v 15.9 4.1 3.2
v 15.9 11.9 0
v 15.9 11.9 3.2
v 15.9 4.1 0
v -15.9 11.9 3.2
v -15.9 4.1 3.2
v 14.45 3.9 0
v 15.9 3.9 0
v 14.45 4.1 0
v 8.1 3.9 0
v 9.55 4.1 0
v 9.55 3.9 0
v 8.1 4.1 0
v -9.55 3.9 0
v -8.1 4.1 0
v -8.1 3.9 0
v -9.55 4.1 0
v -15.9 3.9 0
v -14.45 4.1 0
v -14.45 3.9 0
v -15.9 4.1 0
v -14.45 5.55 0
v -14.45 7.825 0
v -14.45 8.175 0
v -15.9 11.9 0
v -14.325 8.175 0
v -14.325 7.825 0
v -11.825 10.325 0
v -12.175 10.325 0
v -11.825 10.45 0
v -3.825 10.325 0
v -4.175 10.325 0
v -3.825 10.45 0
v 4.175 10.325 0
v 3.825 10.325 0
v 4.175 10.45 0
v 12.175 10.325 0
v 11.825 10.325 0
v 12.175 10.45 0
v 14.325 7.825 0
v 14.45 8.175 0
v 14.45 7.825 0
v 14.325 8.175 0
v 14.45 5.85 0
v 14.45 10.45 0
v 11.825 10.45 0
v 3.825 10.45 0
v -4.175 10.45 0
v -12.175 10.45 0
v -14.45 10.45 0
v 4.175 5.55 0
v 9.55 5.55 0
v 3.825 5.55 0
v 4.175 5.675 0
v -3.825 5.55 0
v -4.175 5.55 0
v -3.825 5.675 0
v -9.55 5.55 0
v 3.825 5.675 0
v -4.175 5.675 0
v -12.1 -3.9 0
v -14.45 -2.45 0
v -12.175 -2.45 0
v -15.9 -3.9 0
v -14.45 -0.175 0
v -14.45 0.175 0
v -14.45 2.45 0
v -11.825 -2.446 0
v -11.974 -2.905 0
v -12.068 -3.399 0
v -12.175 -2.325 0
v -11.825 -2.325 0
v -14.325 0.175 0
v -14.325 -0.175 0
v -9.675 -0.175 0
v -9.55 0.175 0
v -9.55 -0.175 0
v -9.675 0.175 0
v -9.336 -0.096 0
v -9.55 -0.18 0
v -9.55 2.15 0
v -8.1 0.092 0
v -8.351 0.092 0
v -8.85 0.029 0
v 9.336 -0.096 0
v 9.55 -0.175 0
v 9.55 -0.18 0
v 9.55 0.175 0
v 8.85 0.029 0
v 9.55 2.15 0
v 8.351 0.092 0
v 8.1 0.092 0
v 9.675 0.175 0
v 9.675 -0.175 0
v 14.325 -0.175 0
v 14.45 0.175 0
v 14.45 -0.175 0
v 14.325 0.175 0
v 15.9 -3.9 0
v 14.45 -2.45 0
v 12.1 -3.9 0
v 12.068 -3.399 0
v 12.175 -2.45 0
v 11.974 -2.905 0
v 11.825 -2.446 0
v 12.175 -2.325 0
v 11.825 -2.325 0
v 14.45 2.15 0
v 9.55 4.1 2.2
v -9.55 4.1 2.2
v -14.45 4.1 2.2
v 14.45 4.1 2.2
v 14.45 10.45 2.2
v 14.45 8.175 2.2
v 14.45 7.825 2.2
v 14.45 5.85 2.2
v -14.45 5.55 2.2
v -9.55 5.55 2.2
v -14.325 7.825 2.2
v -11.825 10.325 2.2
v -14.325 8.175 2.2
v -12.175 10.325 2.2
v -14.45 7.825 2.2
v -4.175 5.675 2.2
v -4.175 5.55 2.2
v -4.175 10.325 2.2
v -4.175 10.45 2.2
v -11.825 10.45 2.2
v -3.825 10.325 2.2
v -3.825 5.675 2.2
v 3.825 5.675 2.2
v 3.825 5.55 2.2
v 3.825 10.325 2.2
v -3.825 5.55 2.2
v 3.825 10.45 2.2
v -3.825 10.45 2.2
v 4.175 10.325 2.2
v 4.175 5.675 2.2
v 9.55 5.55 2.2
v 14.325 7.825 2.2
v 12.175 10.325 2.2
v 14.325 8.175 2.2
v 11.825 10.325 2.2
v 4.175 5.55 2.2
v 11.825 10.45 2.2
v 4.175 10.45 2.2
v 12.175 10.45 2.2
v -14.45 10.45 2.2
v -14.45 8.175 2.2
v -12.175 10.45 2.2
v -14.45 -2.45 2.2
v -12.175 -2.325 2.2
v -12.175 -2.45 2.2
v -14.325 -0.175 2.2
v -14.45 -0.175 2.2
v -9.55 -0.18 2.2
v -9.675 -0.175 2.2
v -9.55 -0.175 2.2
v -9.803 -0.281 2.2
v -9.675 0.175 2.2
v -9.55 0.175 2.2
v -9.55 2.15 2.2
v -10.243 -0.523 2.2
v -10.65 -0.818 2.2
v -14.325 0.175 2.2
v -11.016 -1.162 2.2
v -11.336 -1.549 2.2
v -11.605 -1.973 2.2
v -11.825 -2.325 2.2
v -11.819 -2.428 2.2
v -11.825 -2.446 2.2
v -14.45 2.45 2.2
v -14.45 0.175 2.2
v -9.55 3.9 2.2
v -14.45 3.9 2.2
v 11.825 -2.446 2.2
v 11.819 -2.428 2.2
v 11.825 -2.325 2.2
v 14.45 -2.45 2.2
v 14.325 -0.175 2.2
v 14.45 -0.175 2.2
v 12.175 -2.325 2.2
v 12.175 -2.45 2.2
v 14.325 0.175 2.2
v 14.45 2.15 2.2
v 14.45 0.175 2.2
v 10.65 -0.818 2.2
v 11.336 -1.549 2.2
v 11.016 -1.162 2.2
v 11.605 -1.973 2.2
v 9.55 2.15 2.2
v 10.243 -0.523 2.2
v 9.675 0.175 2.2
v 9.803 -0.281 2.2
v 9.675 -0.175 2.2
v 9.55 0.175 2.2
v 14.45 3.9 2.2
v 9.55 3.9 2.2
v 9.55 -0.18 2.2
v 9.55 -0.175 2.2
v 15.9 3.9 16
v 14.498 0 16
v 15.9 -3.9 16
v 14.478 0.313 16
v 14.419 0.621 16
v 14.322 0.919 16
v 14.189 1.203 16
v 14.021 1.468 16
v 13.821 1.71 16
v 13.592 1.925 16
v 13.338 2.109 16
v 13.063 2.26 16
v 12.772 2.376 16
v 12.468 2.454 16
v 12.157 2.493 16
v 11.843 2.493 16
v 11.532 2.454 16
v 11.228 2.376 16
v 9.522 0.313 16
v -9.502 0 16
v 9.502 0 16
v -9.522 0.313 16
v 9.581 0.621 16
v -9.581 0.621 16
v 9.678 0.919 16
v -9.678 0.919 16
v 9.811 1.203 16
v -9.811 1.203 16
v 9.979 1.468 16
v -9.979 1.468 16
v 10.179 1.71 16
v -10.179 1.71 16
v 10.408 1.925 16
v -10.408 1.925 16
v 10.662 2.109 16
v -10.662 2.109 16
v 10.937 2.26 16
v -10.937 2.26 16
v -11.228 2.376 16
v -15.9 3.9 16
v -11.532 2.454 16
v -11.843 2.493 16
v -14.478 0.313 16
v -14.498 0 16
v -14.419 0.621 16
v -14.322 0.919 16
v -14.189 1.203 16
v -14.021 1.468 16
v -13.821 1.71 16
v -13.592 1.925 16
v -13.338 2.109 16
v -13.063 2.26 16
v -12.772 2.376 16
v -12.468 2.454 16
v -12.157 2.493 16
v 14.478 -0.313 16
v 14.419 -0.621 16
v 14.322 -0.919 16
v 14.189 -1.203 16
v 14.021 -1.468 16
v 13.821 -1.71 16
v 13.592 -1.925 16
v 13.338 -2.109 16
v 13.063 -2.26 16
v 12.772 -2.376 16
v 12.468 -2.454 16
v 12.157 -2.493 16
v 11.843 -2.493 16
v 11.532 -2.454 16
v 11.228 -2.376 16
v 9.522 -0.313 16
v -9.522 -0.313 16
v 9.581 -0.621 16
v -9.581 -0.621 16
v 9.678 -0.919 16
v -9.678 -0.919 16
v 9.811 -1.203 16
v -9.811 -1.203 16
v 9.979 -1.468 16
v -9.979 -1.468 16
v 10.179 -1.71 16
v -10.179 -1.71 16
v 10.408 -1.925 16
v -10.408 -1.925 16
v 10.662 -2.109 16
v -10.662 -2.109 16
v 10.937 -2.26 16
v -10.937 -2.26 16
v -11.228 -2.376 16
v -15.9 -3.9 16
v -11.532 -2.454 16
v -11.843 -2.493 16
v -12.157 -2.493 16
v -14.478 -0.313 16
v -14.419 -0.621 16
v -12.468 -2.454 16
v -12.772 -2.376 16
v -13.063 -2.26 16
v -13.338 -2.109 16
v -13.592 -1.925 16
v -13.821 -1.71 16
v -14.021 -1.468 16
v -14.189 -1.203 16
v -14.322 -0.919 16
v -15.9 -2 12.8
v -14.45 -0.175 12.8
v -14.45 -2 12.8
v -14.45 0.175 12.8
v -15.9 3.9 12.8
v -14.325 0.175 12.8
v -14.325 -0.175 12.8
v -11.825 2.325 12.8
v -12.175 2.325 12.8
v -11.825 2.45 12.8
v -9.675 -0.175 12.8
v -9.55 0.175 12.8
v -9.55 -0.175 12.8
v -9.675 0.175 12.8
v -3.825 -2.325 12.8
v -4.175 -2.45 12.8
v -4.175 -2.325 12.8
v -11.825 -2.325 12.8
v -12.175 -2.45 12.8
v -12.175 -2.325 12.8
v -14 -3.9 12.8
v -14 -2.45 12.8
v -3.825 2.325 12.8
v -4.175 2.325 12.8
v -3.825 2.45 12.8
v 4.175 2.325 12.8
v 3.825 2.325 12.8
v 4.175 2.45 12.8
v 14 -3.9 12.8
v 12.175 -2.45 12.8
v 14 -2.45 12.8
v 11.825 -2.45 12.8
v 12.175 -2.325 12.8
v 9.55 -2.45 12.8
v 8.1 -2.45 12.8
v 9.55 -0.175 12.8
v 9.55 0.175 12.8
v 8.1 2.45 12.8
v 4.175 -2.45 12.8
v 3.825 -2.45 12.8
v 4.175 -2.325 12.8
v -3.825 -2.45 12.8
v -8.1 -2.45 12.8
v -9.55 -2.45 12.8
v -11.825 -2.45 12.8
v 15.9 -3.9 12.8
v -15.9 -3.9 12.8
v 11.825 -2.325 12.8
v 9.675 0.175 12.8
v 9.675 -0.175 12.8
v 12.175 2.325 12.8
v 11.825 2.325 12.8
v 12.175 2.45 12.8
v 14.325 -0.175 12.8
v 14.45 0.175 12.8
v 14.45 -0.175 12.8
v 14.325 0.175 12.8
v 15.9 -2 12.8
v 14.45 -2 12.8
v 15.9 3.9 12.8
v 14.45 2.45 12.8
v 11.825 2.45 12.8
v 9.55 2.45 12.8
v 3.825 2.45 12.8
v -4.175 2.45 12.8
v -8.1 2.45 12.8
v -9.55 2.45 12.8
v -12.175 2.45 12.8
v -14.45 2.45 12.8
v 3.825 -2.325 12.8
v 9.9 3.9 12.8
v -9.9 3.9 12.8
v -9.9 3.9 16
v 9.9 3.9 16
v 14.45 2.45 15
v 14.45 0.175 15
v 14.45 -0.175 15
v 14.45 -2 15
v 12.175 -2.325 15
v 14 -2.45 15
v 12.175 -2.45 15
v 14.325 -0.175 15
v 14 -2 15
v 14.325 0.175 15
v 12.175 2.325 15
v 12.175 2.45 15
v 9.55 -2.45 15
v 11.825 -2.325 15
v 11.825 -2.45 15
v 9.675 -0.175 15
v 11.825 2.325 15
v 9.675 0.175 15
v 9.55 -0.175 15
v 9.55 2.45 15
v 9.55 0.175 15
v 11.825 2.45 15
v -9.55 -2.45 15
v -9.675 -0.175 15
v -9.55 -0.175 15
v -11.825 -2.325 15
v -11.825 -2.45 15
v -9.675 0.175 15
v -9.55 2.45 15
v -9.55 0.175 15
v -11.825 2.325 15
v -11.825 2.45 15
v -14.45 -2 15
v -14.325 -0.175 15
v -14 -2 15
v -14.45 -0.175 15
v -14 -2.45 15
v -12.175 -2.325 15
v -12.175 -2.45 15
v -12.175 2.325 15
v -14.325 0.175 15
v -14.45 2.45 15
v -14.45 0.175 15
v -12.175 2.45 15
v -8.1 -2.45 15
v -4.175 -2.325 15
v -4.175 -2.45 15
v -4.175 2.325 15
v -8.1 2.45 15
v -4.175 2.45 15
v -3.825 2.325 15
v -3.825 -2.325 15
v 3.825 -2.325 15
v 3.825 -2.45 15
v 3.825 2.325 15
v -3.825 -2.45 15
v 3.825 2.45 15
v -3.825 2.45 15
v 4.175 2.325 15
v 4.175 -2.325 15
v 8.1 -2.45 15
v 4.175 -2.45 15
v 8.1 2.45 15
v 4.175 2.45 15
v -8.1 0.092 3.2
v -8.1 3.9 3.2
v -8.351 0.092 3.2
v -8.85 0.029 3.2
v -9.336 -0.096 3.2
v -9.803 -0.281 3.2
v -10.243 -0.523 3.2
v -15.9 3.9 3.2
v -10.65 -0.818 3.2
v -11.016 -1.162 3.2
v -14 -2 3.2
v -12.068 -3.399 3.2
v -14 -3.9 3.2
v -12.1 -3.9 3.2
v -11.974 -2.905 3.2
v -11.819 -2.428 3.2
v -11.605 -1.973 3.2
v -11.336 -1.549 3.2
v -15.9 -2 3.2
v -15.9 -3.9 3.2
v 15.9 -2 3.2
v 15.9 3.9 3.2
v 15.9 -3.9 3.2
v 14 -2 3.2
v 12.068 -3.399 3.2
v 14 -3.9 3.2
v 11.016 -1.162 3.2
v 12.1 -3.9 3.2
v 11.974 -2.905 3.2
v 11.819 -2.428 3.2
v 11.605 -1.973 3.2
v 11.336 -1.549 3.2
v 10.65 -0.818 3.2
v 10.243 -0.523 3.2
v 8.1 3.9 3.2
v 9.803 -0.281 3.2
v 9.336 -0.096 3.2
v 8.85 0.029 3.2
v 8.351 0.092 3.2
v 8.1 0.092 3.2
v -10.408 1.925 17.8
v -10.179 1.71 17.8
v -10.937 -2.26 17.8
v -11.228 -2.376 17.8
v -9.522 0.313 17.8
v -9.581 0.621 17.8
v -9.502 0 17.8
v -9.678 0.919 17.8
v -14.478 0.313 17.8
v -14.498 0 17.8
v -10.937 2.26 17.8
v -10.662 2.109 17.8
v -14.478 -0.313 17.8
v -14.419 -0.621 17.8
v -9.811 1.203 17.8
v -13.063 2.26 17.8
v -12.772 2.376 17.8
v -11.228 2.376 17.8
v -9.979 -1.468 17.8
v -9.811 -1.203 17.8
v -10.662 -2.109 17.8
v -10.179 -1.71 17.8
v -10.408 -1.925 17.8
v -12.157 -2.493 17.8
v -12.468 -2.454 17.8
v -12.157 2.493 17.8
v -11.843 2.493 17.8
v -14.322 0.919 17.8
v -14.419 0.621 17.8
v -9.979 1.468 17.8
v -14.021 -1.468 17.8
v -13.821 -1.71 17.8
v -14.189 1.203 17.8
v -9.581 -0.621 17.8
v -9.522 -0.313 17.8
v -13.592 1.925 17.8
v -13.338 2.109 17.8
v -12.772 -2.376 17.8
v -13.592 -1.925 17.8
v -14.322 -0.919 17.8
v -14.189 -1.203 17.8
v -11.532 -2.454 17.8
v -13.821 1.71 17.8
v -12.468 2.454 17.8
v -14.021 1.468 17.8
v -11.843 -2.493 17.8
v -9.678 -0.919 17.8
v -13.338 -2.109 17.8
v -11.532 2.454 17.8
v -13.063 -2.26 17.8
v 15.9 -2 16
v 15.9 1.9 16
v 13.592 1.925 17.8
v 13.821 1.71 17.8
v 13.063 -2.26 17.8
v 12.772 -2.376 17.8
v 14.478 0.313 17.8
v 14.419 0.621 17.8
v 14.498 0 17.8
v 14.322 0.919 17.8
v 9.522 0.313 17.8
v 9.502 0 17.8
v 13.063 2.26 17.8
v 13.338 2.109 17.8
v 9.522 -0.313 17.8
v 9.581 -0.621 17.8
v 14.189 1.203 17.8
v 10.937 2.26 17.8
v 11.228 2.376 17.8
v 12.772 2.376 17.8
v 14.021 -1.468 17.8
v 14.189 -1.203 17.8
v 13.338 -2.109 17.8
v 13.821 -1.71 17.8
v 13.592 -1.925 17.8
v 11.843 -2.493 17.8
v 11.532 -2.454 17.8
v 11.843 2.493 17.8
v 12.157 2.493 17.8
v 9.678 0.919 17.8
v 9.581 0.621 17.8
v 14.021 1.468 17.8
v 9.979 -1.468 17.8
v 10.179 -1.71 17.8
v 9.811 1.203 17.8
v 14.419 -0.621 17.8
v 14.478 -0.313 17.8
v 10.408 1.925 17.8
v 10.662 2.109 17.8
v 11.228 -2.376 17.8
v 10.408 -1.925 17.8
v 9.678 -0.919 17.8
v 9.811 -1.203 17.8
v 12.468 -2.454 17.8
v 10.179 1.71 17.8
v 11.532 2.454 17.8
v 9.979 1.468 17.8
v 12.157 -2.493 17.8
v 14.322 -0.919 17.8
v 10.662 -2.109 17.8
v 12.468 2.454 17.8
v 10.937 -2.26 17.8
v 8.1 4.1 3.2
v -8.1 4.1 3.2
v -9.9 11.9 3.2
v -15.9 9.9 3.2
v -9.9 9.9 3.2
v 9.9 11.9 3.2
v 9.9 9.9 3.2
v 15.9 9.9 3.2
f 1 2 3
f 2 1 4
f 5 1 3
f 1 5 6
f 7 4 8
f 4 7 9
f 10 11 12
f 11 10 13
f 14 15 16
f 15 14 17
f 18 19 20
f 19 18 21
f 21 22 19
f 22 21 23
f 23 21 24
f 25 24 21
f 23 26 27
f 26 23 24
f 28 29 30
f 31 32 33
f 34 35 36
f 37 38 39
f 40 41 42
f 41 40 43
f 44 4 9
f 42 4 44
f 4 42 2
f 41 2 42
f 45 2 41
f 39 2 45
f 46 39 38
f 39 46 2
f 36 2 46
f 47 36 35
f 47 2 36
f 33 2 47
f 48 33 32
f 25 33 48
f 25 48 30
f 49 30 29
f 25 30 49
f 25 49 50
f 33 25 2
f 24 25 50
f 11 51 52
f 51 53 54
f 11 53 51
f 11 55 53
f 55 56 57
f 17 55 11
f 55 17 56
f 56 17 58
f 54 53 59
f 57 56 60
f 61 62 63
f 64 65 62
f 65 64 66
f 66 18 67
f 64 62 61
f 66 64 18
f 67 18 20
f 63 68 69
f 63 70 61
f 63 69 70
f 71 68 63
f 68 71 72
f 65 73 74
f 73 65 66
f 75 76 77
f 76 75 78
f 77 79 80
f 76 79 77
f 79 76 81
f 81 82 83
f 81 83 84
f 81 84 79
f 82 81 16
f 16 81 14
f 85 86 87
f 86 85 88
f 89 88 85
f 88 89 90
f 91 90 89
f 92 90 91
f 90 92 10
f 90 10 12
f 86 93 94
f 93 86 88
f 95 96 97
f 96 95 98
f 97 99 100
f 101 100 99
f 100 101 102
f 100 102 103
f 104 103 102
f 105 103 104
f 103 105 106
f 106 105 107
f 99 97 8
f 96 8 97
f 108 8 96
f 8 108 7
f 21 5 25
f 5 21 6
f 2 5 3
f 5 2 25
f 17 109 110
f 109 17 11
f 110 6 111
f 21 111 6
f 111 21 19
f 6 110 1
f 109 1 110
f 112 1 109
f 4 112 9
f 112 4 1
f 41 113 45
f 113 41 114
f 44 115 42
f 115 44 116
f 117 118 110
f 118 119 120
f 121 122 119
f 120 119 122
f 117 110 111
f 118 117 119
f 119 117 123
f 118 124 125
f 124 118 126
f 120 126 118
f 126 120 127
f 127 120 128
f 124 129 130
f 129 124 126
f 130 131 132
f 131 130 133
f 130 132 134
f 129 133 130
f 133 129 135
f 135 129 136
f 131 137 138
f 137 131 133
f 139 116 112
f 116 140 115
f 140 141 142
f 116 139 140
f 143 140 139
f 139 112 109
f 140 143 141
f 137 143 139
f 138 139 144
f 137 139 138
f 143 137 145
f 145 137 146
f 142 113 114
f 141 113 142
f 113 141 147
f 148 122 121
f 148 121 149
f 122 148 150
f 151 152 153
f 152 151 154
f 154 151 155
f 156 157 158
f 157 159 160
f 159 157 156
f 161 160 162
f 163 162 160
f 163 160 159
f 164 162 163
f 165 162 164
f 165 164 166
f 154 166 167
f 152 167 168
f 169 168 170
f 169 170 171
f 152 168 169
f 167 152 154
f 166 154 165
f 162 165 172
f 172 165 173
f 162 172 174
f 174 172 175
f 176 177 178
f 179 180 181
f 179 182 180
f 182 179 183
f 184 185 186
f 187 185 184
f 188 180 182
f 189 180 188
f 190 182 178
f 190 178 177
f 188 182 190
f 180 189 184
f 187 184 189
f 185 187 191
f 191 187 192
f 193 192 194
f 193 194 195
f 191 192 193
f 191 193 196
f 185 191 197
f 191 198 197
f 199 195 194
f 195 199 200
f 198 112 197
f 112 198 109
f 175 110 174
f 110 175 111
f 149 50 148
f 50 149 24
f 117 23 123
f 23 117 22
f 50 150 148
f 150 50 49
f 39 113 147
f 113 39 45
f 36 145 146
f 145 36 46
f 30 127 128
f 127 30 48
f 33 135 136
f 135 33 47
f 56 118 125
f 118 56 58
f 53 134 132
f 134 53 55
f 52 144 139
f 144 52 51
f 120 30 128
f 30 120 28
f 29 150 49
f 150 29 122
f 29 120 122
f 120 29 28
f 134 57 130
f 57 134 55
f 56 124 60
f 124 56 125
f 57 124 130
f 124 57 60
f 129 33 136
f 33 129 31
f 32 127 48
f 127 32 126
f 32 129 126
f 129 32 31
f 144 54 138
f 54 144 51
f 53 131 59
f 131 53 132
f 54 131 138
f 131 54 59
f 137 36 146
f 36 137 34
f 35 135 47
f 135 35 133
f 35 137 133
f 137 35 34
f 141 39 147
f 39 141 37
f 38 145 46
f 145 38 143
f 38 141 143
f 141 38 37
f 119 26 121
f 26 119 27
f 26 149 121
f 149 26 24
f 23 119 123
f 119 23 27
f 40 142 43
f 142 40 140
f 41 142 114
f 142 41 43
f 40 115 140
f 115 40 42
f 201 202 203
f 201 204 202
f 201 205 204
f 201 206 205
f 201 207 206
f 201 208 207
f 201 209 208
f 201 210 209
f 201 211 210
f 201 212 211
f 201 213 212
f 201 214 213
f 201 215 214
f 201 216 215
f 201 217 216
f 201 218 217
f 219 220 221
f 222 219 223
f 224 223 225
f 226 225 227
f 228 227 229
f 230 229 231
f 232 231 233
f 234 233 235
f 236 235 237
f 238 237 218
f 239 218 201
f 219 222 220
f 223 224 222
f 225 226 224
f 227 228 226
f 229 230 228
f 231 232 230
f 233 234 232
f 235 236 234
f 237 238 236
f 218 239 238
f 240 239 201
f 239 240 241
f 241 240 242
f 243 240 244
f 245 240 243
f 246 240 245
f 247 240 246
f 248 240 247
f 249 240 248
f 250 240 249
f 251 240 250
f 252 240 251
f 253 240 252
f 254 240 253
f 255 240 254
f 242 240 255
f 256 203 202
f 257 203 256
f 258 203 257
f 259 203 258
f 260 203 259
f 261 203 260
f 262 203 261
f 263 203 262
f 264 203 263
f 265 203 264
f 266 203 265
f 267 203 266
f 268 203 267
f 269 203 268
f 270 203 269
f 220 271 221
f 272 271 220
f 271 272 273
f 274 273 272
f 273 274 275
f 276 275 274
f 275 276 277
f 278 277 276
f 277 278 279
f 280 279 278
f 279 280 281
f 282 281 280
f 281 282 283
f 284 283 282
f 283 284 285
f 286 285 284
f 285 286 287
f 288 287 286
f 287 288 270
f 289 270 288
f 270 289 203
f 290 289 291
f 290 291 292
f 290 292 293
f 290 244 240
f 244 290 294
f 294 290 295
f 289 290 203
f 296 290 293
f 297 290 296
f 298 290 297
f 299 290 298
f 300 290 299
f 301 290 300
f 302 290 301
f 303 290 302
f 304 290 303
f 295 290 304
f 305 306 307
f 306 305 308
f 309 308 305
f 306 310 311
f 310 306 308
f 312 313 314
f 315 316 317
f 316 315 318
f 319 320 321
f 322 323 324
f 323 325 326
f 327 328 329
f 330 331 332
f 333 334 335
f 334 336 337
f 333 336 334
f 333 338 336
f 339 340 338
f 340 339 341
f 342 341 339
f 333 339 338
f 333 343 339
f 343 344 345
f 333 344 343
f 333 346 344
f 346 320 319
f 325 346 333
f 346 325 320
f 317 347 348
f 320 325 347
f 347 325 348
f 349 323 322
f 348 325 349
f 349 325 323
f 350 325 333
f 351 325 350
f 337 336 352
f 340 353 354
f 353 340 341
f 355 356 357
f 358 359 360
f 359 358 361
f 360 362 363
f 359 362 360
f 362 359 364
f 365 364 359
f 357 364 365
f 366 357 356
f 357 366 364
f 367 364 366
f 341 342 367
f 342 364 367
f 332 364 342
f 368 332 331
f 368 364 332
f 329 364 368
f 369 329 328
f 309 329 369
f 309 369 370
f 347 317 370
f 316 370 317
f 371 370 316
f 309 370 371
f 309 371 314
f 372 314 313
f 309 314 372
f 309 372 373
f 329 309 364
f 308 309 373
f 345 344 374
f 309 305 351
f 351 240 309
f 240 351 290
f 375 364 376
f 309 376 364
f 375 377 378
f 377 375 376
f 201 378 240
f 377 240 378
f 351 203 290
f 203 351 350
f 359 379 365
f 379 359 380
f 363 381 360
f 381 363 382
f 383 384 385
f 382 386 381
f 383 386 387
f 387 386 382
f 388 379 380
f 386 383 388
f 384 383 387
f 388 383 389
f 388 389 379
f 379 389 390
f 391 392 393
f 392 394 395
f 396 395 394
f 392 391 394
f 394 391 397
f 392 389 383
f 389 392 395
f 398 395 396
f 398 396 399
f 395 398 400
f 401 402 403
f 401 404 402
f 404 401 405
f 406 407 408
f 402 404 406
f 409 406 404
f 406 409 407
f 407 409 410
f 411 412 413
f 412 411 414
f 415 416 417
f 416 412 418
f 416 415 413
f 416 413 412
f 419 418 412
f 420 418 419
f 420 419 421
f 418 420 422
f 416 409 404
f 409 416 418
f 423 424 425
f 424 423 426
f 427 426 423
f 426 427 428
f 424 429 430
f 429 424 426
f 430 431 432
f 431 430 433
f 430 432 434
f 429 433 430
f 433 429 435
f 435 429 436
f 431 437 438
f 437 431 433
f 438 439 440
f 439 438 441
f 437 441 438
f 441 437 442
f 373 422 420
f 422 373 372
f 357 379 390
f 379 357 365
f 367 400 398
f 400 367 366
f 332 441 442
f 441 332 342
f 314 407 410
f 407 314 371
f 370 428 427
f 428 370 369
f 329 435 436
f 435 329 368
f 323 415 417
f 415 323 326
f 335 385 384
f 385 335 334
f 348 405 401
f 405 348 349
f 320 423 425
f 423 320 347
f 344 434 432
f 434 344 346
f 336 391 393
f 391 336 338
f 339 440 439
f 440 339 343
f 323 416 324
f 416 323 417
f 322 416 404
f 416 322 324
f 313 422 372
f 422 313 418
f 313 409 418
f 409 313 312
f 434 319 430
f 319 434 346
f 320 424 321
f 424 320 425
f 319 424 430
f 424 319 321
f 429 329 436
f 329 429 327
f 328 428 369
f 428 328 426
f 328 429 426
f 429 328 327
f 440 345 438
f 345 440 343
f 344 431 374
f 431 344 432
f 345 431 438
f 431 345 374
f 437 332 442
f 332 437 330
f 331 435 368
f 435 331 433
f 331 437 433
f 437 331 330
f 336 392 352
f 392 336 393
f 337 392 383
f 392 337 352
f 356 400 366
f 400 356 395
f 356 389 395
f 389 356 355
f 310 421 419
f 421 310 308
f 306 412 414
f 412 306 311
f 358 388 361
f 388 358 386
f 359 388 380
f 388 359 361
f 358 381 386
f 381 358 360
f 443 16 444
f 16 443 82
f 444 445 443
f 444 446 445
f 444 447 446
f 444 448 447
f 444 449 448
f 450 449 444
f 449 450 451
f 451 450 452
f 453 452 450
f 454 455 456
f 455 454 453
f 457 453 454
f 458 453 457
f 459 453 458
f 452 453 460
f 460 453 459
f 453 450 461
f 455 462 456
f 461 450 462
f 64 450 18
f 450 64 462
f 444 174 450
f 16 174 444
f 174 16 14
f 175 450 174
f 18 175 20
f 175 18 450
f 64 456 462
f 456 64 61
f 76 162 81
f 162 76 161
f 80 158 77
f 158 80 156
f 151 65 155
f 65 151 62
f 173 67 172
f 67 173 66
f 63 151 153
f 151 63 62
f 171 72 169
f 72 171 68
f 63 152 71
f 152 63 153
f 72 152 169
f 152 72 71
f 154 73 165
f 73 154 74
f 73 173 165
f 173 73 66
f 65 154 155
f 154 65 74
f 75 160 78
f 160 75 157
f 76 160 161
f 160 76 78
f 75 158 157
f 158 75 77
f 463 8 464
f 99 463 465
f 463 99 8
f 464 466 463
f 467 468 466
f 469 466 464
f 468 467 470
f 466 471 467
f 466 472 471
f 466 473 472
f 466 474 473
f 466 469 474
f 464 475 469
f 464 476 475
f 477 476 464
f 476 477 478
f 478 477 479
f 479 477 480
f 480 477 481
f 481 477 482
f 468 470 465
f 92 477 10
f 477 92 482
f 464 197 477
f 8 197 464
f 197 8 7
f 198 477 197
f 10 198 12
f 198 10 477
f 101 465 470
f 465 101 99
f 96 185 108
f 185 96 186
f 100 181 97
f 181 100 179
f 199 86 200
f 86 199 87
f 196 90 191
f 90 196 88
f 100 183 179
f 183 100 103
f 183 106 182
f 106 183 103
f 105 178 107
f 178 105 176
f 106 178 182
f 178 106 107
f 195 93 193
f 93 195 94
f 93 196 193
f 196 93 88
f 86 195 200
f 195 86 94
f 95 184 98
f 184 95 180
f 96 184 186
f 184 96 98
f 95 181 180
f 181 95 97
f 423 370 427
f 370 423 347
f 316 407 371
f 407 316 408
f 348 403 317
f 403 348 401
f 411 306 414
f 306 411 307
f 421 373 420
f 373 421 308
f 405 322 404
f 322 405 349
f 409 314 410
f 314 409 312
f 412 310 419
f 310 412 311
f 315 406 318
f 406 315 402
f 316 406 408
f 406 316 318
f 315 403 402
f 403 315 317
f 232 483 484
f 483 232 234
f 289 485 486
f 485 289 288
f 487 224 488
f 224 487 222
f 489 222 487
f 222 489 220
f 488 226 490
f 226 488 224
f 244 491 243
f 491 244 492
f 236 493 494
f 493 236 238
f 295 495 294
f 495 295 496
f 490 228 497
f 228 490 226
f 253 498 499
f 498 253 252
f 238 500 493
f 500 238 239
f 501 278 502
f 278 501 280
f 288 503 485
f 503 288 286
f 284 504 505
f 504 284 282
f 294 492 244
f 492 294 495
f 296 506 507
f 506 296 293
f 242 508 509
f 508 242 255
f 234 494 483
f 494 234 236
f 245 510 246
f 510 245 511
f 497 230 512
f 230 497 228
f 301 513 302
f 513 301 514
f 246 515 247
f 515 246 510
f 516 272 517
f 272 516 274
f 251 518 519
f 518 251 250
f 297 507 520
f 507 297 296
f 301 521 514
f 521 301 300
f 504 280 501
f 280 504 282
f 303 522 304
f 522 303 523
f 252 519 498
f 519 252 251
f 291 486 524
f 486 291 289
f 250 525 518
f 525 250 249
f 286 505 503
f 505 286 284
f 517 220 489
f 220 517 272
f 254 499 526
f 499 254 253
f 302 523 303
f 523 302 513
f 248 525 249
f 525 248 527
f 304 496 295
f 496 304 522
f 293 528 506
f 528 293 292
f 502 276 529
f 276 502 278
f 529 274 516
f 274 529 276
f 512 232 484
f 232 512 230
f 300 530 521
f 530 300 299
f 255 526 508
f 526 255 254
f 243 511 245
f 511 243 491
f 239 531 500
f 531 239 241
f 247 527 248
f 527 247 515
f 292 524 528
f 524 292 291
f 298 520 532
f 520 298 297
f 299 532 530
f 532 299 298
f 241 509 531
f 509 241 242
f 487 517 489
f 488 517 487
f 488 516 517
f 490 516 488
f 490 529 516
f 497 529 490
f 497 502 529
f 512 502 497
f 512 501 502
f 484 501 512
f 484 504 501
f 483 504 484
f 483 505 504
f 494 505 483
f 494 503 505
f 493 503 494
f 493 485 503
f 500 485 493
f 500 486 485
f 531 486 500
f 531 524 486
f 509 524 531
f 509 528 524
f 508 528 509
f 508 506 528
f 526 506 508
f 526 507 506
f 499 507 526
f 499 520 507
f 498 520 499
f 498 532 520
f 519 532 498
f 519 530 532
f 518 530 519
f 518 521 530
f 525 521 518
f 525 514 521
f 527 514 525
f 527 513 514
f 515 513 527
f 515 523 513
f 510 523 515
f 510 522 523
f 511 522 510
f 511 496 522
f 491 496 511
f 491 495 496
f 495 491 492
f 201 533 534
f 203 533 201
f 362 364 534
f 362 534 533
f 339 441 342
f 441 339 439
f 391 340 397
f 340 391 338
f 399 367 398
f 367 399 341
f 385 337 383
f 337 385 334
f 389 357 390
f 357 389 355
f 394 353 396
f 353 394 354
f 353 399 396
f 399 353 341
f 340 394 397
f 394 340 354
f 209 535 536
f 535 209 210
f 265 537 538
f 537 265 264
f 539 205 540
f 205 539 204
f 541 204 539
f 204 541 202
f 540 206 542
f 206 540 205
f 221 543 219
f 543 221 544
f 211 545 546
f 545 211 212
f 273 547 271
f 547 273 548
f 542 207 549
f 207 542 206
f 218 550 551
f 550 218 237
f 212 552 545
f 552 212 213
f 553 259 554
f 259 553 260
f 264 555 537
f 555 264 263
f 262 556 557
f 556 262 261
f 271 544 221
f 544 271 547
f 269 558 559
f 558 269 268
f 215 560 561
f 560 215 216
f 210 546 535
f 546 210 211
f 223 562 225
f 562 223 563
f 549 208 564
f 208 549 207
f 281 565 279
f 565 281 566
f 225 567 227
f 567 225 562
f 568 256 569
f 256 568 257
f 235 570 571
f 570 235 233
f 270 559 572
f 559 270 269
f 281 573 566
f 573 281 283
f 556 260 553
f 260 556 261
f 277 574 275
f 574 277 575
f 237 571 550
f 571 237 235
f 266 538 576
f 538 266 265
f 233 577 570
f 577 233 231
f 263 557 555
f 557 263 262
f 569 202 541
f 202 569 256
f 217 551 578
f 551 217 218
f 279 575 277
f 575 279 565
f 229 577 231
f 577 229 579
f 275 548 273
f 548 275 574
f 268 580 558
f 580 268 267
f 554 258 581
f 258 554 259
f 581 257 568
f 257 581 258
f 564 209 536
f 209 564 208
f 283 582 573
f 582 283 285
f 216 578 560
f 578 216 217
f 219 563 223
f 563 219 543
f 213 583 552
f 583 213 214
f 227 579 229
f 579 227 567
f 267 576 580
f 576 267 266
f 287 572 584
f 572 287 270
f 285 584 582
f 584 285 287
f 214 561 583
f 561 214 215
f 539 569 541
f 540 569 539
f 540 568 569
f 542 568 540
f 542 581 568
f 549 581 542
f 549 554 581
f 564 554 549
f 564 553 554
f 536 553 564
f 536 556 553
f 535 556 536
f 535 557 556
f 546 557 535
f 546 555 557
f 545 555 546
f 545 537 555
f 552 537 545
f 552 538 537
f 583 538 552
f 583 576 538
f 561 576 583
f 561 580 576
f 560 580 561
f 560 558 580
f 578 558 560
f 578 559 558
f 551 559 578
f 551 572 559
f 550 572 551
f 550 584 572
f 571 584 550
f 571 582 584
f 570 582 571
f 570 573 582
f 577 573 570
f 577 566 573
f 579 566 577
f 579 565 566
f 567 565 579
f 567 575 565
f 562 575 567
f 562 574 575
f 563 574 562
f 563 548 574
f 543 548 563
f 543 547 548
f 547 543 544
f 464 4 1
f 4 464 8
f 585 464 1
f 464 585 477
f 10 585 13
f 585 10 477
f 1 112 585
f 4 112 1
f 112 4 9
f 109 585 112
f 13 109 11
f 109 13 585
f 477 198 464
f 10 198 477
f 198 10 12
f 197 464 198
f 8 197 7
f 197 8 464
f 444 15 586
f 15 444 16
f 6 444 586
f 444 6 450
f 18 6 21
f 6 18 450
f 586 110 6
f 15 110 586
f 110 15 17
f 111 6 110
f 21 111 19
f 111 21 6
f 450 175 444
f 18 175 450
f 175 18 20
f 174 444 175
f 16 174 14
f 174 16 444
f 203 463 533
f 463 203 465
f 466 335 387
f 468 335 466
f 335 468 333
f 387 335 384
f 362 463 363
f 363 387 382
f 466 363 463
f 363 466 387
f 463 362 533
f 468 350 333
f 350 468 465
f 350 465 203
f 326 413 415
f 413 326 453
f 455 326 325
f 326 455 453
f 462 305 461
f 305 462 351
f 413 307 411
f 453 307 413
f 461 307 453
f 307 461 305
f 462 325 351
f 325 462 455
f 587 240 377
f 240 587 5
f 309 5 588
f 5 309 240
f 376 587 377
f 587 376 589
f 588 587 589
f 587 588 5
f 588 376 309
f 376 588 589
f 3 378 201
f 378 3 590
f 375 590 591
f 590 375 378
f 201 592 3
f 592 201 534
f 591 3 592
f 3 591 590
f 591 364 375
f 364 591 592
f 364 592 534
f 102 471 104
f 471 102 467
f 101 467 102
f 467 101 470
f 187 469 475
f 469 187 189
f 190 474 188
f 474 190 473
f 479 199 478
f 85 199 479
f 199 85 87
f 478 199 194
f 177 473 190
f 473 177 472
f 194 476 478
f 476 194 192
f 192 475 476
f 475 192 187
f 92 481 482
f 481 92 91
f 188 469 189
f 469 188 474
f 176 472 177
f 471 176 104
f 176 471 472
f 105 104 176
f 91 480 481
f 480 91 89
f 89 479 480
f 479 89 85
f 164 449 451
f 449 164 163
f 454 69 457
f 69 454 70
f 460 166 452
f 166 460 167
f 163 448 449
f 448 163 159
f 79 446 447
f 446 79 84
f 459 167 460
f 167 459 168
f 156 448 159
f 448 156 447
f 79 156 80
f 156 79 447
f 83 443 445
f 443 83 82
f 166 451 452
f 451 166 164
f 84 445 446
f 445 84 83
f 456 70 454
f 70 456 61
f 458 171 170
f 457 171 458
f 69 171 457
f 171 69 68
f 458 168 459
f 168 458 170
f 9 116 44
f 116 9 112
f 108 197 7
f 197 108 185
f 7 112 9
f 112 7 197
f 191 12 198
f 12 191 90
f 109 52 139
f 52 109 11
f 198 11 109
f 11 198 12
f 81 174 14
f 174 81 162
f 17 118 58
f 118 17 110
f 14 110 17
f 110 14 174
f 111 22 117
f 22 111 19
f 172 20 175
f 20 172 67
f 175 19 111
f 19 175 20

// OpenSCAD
// file: globals.scad
// brick dependent parameters
brick_height = 9.6; // Height of the non-stud portion of a regular brick.
stud_spacing=8; // Distance between centers of studs.
stud_diameter=4.85; // Diameters of studs.
wall_play=0.1; // Amount of space removed from the outer edge of bricks so that they will fit next to each other.
roof_thickness=1;
wall_thickness=1.45;

post_wall_thickness = 0.85;
pin_diameter=3 ;
post_diameter=6.5;

hollow_stud_inner_diameter = 3.1;
stud_height = 1.8;

axle_spline_width = 2.0;
axle_diameter = 5 * 1;

$fn=50;

// printing depoendent parameters
STUD_SCALE_UP = 1.03;
STUD_SCALE_SIDE = 1.0;
STUD_SCALE_DOWN = 1.0;
SPLINE_SCALE_DOWN = 0.5;
SPLINE_SCALE_UP = 1.0;
SPLINE_SCALE_SIDE = 1.0;

module uncenter(width, length, height) {
    translate([((8 * length) / 2), ((8 * width) / 2), height ? ((8 * height) / 2) : 0]) children();
}

module center(width, length, height) {
    translate([-((8 * length) / 2), -((8 * width) / 2), height ? -((8 * height) / 2) : 0]) children();
}

module place(x, y, z=0) {
    translate([8 * y, 8 * x, z * 9.6]) children();
}
// main file
use <brick.scad>
include <globals.scad>


module windscreen(beam_thickness=2, beam_width=6, 
    height=4/3, length=4) {
        
    difference(){
        union(){
            // base blocks
            translate([0,8,0])block(length,1,1/3,type="tile");
            translate([0,0,brick_height*height])block(length,1,1/3,type="tile");
            translate([-(length-1)*stud_spacing/2,0,0])block(1,1,1/3,type="tile");
            translate([(length-1)*stud_spacing/2,0,0])block(1,1,1/3,type="tile");
            translate([-(length-1)*stud_spacing/2,0,brick_height*height])block(1,1,1/3);
            translate([(length-1)*stud_spacing/2,0,brick_height*height])block(1,1,1/3);

            // play gap filling
            translate([(length/2-1)*stud_spacing+wall_play, stud_spacing/2-wall_play, 0]) cube([stud_spacing-2*wall_play, 2*wall_play, brick_height/3]);
            translate([-(length/2)*stud_spacing+wall_play, stud_spacing/2-wall_play, 0]) cube([stud_spacing-2*wall_play, 2*wall_play, brick_height/3]);
            
            // vertical beams
            translate([length*stud_spacing/2-beam_thickness,-stud_spacing/2+wall_play,brick_height/3]) 
                cube([beam_thickness-wall_play, beam_thickness-wall_play, height*brick_height]);
            translate([-length*stud_spacing/2+wall_play,-stud_spacing/2+wall_play,brick_height/3]) 
                cube([beam_thickness-wall_play, beam_thickness-wall_play, height*brick_height]);

            // slope beams
            translate([-length*stud_spacing/2+wall_play,1.5*stud_spacing-beam_thickness-wall_play,(height+1/3)*brick_height])
            rotate([-90,0,-90])
            linear_extrude(beam_width) polygon([[stud_spacing,0],[stud_spacing-beam_thickness,0],
                    [-beam_thickness,brick_height*height],[0,brick_height*height]]);
            translate([length*stud_spacing/2-wall_play-beam_width,1.5*stud_spacing-beam_thickness-wall_play,(height+1/3)*brick_height])
            rotate([-90,0,-90])
            linear_extrude(beam_width) polygon([[stud_spacing,0],[stud_spacing-beam_thickness,0],
                    [-beam_thickness,brick_height*height],[0,brick_height*height]]);

        }
        
        // // lower holes
        translate([(length/2-1)*stud_spacing+wall_play,-stud_spacing/2+wall_play,0]) cylinder(r=4,h=brick_height/3);
        translate([-(length/2-1)*stud_spacing-wall_play,-stud_spacing/2+wall_play,0]) cylinder(r=4,h=brick_height/3);
        
        // play gap filling underneath removal
        translate([(length/2-1)*stud_spacing+wall_thickness+wall_play, stud_spacing/2-wall_thickness-0.4, 0]) cube([stud_spacing-2*wall_thickness-2*wall_play, 2*wall_thickness+0.8,brick_height/3-roof_thickness]);
        translate([-(length/2)*stud_spacing+wall_thickness+wall_play, stud_spacing/2-wall_thickness-0.4, 0]) cube([stud_spacing-2*wall_thickness-2*wall_play, 2*wall_thickness+0.8,brick_height/3-roof_thickness]);
        
        
        // translate([WALL_THICKNESS+PLAY,0,6*PLATE_HEIGHT])cube([UNIT_LENGTH-WALL_THICKNESS,UNIT_LENGTH-WALL_THICKNESS,PLATE_HEIGHT-ROOF_THICKNESS]);
        // translate([5*UNIT_LENGTH-space,0,6*PLATE_HEIGHT])cube([UNIT_LENGTH-WALL_THICKNESS,UNIT_LENGTH-WALL_THICKNESS,PLATE_HEIGHT-ROOF_THICKNESS]);
        
    }
}
windscreen();
